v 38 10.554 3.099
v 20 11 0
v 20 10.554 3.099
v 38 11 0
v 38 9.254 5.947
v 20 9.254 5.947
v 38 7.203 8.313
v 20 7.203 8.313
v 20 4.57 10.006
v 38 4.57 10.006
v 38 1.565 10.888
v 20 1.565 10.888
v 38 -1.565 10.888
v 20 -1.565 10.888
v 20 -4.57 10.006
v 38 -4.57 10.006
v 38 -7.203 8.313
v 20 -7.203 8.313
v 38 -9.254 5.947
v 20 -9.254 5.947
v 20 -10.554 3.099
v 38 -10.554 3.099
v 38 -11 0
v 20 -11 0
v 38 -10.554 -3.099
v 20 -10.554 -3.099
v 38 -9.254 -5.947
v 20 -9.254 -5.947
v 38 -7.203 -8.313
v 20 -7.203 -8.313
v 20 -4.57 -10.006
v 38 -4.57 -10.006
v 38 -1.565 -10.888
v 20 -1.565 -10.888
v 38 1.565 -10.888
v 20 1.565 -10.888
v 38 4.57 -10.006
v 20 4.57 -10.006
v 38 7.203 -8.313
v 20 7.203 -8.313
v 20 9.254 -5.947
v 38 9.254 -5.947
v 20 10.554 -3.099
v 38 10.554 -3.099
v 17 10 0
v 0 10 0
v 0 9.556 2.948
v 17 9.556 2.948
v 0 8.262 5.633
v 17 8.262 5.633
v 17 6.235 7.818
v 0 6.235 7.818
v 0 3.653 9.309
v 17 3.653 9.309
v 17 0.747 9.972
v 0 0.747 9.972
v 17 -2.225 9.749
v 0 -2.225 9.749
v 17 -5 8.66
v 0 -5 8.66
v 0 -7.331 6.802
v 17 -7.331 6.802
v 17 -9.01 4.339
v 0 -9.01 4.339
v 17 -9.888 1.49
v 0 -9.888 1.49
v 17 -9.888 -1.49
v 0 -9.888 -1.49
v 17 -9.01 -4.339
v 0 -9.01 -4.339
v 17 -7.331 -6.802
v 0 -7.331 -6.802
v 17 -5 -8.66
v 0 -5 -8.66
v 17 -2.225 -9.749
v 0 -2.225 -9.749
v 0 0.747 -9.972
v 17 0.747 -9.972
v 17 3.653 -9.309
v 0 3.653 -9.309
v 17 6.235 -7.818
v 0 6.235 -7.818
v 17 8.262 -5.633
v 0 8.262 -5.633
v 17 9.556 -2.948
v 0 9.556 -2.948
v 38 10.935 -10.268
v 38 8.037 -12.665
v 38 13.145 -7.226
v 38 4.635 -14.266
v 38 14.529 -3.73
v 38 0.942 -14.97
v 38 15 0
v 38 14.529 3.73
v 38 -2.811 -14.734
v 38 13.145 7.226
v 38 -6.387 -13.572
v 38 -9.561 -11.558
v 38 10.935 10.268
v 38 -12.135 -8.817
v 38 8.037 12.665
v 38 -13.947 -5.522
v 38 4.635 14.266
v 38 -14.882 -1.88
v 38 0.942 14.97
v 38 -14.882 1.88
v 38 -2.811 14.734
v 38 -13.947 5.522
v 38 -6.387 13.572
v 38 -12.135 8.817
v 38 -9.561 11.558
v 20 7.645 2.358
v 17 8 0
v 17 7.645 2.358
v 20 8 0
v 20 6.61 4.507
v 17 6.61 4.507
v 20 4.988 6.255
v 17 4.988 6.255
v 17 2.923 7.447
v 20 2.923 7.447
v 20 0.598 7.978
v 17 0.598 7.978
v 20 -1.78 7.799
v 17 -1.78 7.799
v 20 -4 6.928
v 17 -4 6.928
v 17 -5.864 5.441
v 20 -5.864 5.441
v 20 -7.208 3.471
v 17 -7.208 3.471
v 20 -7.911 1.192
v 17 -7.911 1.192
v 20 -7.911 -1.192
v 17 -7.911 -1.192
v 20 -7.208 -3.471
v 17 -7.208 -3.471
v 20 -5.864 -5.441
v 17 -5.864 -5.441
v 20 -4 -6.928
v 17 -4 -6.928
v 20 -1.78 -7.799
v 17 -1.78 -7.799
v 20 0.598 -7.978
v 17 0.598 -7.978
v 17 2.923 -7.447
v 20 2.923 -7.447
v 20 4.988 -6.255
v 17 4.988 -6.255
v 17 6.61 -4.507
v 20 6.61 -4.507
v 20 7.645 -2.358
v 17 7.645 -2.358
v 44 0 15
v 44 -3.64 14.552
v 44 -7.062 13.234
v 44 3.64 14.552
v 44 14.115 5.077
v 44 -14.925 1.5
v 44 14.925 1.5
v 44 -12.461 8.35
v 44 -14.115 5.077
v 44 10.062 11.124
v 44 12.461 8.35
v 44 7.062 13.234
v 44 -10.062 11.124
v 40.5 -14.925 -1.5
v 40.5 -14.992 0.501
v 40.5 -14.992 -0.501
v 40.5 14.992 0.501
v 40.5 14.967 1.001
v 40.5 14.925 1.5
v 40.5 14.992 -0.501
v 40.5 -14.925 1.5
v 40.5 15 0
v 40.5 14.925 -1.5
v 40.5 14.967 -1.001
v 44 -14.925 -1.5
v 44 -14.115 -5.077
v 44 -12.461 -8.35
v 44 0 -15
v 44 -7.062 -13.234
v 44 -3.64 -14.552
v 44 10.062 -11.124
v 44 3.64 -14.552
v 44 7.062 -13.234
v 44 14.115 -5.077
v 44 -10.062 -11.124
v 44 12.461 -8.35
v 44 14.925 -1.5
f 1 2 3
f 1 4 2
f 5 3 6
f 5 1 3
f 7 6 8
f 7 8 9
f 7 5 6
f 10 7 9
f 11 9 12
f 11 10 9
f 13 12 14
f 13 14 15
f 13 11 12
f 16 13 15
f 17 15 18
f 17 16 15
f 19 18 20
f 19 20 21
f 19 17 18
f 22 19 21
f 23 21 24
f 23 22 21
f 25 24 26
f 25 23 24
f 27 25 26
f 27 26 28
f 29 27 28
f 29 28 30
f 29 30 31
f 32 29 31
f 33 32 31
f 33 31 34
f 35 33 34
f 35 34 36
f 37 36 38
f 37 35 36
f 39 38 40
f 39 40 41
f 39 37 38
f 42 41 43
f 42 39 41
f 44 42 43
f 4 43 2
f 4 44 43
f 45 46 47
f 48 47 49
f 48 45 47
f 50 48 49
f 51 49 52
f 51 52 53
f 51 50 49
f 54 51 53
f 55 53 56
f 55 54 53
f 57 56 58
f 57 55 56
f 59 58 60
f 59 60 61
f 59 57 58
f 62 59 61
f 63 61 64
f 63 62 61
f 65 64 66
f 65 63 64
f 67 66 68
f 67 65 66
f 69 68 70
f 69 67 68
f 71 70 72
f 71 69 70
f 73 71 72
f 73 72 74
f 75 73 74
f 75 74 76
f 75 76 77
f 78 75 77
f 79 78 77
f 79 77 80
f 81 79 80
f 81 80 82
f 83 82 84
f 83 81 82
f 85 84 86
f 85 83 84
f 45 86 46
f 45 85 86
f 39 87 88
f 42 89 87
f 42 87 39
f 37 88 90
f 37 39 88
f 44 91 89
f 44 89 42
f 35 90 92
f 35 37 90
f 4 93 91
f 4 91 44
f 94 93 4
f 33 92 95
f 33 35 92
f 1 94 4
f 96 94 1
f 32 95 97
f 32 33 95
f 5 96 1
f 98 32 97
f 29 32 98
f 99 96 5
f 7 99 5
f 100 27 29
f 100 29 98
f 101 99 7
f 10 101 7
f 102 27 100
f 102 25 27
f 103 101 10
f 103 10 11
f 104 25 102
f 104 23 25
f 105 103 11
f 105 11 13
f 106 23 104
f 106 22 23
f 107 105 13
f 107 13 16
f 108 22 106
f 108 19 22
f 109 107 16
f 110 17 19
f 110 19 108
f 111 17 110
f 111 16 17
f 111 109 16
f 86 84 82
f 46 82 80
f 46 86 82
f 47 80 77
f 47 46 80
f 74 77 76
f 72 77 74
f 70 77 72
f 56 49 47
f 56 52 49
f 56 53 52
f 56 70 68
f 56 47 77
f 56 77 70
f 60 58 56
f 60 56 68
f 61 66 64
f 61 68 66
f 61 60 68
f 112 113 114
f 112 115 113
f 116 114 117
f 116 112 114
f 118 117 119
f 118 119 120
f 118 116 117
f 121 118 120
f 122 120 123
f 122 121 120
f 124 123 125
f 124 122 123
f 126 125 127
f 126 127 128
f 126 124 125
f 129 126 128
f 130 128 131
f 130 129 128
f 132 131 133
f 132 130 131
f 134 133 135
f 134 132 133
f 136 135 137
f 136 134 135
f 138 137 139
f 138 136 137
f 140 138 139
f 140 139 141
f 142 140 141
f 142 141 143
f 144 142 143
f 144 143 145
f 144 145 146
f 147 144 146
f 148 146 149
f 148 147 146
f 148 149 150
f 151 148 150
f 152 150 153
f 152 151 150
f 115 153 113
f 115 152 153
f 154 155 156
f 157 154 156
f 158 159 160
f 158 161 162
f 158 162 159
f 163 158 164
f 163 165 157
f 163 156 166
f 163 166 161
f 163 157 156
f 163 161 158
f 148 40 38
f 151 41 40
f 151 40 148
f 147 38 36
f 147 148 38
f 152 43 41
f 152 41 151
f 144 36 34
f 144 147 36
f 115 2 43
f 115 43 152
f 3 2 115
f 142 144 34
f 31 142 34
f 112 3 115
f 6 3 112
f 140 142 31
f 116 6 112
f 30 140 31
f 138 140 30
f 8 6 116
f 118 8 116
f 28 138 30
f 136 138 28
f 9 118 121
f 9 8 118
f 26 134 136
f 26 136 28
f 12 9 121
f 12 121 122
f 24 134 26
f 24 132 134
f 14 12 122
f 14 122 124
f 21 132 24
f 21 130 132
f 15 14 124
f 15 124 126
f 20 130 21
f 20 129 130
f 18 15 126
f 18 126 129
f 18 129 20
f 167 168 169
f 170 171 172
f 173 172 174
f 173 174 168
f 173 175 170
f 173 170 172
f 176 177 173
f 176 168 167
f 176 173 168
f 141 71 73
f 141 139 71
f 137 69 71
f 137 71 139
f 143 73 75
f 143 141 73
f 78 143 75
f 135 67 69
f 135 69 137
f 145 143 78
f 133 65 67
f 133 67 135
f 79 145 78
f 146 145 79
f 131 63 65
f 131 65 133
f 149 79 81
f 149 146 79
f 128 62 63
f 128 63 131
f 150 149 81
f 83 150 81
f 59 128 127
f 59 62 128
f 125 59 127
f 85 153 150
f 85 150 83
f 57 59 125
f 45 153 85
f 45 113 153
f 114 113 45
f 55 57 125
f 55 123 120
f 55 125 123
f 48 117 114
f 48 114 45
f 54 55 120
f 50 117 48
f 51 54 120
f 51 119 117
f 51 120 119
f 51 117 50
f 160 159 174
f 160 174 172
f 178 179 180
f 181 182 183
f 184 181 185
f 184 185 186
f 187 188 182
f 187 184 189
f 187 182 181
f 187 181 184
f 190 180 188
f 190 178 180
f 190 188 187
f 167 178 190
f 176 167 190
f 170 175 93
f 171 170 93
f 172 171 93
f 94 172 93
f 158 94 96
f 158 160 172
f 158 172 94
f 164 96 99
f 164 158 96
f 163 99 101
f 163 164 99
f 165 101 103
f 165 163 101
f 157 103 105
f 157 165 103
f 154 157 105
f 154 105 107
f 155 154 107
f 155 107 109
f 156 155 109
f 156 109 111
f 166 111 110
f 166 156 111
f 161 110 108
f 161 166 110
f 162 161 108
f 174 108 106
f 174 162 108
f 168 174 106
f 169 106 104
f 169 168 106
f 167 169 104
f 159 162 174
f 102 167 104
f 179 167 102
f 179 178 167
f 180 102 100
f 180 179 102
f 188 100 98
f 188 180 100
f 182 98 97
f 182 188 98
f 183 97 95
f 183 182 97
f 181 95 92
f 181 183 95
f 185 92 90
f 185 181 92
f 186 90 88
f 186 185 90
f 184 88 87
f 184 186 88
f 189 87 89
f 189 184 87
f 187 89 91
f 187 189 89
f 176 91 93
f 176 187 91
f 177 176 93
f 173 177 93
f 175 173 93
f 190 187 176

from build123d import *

# Parameters (mm, degrees)
SKETCH2_W          = 3
SKETCH2_H          = 33.9969588
CUT_EXTRUDE1_DEPTH = 3.5


with BuildPart() as part:
    # Sketch1 → Revolve1 (revolve)
    with BuildSketch(Plane.XY):
        Polygon((0, 0), (0, 10), (17, 10), (17, 8), (20, 8), (20, 11), (38, 11), (38, 15), (44, 15), (44, 0), align=None)
    revolve(axis=Axis((0, 0, 0), (1, 0, 0)))

    # Sketch2 → Cut-Extrude1 (cut)
    with BuildSketch(Plane(origin=(44, 0, 0), x_dir=(0, 0, -1), z_dir=(1, 0, 0))):
        Rectangle(SKETCH2_W, SKETCH2_H)
    extrude(amount=-CUT_EXTRUDE1_DEPTH, mode=Mode.SUBTRACT)


solid = part.part
